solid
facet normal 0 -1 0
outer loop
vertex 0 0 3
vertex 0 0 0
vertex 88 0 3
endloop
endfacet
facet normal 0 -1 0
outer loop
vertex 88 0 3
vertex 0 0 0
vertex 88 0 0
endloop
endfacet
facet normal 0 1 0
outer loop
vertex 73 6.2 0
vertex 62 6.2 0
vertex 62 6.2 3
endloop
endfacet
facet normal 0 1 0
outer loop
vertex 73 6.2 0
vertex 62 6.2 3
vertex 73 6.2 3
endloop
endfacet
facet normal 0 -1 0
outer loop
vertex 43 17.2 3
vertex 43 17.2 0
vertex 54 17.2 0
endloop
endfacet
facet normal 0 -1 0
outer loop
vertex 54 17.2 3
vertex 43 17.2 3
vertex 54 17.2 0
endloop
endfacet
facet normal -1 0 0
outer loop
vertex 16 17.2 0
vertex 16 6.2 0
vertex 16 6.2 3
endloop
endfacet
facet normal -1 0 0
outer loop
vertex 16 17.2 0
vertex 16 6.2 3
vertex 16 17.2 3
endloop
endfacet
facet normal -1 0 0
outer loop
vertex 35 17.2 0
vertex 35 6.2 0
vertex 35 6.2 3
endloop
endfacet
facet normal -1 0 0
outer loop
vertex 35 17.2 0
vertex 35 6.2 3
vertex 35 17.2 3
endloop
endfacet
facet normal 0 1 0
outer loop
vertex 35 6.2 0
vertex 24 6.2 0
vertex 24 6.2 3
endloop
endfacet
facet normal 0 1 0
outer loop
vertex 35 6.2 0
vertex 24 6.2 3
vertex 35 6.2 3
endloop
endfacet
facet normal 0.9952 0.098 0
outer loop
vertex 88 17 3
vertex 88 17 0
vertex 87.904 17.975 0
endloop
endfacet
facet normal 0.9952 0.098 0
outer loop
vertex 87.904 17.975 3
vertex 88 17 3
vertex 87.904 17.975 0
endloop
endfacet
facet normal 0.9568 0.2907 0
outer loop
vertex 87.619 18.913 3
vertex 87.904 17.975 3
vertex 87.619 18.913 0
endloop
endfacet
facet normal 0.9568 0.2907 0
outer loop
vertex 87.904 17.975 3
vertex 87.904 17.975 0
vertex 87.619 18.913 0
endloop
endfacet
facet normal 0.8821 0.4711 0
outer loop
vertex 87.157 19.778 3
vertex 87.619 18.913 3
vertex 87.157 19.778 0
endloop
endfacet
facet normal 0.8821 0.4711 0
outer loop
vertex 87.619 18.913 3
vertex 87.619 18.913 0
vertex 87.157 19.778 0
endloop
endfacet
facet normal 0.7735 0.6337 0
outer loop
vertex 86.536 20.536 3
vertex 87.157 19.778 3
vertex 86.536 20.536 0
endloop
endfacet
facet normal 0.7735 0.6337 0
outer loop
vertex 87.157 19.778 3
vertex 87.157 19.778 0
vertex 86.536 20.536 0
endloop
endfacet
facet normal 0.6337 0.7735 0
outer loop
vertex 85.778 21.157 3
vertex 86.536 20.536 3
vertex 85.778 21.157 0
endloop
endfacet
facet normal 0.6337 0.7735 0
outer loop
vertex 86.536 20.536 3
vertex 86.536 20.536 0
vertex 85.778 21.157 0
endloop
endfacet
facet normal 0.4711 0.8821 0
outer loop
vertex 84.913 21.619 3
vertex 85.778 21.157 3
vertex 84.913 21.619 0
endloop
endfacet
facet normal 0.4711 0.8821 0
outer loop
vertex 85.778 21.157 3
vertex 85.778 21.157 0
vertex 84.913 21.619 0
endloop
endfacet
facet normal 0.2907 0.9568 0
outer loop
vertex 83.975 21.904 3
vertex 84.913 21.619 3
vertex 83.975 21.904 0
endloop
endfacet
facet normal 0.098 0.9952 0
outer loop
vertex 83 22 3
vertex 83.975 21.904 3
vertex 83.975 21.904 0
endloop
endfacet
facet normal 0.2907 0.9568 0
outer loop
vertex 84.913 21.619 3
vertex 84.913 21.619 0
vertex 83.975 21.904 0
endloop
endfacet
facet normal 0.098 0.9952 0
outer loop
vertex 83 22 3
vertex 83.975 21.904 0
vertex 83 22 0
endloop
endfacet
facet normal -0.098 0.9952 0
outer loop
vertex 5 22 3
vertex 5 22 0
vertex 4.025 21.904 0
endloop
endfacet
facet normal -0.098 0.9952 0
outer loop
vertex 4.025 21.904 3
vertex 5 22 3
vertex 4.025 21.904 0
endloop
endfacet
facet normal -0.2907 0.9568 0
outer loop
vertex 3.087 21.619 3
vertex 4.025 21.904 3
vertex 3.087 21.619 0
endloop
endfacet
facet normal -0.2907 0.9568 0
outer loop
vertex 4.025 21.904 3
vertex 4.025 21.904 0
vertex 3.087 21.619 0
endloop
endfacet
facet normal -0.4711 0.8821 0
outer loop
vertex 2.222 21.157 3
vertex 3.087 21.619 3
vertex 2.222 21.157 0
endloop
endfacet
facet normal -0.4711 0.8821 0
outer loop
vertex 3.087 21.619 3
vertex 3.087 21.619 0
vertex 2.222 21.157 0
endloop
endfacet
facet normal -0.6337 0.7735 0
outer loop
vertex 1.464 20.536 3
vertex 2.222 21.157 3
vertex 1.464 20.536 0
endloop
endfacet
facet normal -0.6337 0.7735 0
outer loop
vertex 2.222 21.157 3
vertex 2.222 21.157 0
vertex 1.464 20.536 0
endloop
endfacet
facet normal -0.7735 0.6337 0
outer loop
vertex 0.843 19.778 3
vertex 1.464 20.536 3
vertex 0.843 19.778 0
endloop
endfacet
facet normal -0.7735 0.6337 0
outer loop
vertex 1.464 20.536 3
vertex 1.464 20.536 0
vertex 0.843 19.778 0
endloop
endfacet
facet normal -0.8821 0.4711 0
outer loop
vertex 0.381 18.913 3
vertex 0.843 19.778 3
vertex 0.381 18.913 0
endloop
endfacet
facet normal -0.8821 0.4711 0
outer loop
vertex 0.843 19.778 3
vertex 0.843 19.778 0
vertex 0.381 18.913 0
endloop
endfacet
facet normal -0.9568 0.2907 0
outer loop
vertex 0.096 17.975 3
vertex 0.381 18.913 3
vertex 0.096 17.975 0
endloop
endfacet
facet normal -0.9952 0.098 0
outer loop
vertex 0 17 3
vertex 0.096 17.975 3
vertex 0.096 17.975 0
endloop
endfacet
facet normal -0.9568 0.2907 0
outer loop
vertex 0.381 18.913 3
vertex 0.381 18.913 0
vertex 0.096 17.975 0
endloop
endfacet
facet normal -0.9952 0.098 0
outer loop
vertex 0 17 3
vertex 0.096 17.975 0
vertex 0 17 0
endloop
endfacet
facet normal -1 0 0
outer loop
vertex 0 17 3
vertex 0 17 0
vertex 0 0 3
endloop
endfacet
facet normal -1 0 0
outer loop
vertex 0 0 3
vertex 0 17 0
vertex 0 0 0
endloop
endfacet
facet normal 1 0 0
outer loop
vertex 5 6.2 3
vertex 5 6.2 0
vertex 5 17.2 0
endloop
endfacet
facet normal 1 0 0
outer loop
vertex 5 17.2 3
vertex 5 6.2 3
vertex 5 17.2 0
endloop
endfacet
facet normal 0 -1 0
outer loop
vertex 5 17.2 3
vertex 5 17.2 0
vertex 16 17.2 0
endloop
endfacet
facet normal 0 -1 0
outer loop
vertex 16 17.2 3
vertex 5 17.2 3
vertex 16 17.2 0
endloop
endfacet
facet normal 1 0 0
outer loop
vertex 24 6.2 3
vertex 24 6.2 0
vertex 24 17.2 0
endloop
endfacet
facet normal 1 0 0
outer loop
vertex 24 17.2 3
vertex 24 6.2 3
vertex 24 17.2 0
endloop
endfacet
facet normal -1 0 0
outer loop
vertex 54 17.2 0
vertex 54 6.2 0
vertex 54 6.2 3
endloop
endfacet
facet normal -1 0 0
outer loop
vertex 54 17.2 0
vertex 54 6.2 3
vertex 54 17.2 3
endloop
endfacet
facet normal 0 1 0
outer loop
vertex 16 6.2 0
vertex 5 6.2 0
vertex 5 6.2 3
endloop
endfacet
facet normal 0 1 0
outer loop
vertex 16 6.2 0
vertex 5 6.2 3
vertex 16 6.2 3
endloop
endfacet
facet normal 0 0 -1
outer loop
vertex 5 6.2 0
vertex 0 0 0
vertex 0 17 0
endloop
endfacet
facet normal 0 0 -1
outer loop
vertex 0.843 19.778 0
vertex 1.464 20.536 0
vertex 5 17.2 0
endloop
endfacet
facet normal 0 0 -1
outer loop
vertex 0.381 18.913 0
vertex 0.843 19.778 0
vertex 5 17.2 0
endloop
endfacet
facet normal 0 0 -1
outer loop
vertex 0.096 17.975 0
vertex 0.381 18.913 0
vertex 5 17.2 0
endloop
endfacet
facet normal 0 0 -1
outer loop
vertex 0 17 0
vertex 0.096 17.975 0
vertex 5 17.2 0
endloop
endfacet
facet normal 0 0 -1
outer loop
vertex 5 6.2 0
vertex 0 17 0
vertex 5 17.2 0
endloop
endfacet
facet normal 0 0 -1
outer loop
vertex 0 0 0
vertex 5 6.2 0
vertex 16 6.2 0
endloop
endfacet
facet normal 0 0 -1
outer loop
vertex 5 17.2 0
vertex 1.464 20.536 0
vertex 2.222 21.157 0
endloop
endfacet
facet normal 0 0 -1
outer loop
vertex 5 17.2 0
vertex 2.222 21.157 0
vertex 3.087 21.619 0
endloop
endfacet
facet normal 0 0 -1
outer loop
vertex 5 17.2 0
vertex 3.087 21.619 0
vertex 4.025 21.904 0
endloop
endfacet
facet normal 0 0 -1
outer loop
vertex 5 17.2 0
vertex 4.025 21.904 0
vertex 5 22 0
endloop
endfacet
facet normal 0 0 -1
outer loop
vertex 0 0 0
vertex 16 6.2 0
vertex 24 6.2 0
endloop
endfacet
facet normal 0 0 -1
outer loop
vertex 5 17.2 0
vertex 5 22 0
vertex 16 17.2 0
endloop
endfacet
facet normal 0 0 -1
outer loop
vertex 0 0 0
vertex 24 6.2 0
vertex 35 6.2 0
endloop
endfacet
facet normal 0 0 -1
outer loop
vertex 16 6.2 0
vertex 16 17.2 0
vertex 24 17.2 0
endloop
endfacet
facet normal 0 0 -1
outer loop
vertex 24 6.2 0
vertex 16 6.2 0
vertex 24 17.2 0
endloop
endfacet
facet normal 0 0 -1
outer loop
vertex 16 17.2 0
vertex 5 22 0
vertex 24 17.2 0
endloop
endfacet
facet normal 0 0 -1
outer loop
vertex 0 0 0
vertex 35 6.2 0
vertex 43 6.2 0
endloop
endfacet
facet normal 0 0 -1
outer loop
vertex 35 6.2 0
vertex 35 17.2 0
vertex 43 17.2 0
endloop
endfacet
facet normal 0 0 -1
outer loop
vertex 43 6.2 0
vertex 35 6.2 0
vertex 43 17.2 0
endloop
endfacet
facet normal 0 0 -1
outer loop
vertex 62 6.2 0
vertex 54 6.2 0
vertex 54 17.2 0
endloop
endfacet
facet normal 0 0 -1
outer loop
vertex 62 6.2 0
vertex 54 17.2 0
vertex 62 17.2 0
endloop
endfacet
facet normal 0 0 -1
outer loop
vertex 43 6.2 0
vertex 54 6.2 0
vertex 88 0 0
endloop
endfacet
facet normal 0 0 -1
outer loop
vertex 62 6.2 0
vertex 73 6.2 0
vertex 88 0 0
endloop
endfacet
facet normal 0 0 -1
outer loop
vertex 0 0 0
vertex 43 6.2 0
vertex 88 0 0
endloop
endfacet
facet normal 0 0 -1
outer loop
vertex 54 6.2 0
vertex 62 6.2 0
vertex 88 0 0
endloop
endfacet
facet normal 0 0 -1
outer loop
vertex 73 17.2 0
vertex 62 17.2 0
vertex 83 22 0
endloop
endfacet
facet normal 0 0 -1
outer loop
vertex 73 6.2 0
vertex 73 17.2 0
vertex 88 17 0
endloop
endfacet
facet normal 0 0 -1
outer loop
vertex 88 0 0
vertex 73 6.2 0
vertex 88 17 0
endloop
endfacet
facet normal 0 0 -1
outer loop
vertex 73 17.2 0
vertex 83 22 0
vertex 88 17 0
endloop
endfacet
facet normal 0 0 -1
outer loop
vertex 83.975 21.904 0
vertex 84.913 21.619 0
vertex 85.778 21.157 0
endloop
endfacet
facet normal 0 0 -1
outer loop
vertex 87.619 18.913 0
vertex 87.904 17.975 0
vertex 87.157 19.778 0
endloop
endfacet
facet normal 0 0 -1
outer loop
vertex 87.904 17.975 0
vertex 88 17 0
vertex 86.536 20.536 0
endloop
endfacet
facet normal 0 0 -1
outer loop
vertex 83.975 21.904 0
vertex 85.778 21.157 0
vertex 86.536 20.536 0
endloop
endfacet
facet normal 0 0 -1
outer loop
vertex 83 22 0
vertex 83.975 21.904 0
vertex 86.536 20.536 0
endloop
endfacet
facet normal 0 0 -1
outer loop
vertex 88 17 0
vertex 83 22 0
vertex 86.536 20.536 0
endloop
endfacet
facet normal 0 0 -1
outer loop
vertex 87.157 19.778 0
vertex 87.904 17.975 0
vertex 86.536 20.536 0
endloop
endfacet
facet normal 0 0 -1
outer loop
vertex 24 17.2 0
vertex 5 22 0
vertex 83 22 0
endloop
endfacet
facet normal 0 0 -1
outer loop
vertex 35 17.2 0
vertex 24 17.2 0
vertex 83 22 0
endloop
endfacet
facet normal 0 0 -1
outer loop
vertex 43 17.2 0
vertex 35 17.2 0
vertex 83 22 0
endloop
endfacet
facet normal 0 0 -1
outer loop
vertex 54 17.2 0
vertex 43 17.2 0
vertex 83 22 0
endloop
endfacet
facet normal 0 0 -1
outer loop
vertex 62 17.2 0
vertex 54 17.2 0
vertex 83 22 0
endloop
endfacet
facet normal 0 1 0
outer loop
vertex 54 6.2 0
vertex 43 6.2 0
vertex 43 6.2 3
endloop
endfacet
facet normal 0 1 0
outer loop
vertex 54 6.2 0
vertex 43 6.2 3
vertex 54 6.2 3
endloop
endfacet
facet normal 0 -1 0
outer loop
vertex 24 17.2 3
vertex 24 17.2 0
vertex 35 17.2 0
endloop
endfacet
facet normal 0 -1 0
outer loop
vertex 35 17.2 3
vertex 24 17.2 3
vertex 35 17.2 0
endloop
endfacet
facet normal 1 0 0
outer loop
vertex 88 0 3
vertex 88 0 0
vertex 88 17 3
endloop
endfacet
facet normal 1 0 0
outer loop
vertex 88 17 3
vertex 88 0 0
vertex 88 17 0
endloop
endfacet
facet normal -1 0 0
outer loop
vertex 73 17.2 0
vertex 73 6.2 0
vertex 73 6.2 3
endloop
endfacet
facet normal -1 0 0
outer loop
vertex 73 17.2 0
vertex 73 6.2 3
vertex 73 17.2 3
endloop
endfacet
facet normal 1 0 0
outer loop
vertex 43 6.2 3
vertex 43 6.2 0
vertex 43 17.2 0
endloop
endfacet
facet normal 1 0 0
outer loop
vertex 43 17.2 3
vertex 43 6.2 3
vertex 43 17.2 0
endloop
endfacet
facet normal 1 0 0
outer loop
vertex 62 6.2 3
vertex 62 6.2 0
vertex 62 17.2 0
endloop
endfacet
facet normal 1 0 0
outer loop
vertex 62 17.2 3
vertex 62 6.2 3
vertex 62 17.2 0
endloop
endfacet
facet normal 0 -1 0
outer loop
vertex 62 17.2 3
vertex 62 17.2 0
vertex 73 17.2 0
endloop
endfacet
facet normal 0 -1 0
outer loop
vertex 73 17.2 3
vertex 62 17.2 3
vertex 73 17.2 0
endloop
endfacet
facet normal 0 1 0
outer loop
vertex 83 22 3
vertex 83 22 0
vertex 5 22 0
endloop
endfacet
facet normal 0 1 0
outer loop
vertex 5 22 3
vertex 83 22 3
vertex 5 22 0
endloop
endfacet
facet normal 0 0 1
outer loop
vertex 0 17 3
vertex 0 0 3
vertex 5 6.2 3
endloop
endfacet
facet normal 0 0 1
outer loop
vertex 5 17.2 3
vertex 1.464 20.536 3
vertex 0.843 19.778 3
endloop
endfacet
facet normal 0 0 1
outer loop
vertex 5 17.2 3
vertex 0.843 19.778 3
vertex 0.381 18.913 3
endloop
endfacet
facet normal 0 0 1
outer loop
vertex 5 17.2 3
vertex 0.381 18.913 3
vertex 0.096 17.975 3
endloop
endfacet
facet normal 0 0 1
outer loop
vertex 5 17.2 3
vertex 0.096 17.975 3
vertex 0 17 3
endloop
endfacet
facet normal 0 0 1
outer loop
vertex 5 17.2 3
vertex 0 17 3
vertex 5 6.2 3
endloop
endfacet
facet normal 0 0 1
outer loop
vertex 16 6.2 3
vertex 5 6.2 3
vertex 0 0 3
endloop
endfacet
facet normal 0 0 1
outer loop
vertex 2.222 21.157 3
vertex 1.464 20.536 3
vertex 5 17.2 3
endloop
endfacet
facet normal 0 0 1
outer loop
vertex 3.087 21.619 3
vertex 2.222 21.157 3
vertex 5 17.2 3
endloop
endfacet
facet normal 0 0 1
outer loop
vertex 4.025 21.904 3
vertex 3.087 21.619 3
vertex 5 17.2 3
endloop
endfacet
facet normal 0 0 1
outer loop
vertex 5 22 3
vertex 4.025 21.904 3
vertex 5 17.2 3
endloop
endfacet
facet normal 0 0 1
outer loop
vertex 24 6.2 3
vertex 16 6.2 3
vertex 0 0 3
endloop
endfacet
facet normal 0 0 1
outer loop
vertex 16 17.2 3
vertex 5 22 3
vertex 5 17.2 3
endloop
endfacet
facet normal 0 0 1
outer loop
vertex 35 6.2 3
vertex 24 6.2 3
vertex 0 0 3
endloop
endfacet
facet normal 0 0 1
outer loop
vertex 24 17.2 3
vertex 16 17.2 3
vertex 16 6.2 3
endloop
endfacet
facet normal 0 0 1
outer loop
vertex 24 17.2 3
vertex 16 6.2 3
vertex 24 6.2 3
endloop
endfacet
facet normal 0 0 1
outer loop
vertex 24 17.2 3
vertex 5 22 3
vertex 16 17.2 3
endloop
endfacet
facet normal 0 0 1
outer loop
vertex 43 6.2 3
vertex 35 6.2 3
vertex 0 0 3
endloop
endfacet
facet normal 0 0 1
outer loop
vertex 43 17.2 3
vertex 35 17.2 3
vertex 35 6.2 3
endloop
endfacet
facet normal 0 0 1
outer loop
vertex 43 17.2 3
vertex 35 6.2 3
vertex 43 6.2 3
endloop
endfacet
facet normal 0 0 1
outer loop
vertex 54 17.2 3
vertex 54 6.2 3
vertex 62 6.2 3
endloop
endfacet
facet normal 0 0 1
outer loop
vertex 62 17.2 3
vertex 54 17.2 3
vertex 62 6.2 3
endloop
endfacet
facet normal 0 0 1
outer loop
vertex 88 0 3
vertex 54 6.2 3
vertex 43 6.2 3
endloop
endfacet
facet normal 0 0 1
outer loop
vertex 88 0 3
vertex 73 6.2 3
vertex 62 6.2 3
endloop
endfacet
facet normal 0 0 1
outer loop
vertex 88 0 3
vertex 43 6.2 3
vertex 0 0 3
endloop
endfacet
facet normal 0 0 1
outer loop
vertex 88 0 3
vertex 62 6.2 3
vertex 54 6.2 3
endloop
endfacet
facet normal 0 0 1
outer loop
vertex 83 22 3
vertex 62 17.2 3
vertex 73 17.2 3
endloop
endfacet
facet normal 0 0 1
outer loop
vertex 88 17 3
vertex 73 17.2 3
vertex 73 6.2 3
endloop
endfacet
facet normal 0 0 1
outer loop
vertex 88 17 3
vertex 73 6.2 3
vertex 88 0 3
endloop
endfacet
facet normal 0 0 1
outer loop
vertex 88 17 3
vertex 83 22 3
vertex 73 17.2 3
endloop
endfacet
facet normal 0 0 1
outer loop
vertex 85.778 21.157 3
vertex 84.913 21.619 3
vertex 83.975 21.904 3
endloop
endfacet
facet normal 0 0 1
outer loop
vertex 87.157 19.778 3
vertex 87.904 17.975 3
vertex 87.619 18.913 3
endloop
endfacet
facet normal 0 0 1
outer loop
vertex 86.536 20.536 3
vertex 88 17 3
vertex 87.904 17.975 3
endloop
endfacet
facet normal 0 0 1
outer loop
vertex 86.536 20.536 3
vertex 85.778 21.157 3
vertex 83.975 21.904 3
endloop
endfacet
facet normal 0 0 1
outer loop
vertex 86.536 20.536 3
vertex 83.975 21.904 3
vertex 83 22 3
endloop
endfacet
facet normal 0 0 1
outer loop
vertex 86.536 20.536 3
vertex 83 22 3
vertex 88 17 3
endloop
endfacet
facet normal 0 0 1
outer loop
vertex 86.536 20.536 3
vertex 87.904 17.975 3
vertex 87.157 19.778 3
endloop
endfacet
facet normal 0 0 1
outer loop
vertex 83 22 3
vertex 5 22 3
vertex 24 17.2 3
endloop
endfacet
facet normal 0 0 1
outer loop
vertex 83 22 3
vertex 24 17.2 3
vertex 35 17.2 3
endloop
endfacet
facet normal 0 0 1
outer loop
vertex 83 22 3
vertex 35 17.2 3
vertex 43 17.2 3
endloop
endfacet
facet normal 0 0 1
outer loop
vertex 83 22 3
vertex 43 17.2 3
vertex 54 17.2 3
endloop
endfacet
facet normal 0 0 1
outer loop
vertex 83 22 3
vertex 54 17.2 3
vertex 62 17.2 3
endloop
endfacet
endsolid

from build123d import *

# Parameters (mm, degrees)
SKETCH1_W           = 11
SKETCH1_H           = 11
BOSS_EXTRUDE1_DEPTH = 3


with BuildPart() as part:
    # Sketch1 → Boss-Extrude1 (new body)
    with BuildSketch(Plane.XY):
        with BuildLine():
            Line((0, 0), (88, 0))
            Line((88, 0), (88, 17))
            ThreePointArc((88, 17), (86.535533906, 20.535533906), (83, 22))
            Line((83, 22), (5, 22))
            ThreePointArc((5, 22), (1.464466094, 20.535533906), (0, 17))
            Line((0, 17), (0, 0))
        make_face()
        with Locations((10.5, 11.7)):
            Rectangle(SKETCH1_W, SKETCH1_H, mode=Mode.SUBTRACT)
        with Locations((29.5, 11.7)):
            Rectangle(SKETCH1_W, SKETCH1_H, mode=Mode.SUBTRACT)
        with Locations((48.5, 11.7)):
            Rectangle(SKETCH1_W, SKETCH1_H, mode=Mode.SUBTRACT)
        with Locations((67.5, 11.7)):
            Rectangle(SKETCH1_W, SKETCH1_H, mode=Mode.SUBTRACT)
    extrude(amount=BOSS_EXTRUDE1_DEPTH)


solid = part.part
